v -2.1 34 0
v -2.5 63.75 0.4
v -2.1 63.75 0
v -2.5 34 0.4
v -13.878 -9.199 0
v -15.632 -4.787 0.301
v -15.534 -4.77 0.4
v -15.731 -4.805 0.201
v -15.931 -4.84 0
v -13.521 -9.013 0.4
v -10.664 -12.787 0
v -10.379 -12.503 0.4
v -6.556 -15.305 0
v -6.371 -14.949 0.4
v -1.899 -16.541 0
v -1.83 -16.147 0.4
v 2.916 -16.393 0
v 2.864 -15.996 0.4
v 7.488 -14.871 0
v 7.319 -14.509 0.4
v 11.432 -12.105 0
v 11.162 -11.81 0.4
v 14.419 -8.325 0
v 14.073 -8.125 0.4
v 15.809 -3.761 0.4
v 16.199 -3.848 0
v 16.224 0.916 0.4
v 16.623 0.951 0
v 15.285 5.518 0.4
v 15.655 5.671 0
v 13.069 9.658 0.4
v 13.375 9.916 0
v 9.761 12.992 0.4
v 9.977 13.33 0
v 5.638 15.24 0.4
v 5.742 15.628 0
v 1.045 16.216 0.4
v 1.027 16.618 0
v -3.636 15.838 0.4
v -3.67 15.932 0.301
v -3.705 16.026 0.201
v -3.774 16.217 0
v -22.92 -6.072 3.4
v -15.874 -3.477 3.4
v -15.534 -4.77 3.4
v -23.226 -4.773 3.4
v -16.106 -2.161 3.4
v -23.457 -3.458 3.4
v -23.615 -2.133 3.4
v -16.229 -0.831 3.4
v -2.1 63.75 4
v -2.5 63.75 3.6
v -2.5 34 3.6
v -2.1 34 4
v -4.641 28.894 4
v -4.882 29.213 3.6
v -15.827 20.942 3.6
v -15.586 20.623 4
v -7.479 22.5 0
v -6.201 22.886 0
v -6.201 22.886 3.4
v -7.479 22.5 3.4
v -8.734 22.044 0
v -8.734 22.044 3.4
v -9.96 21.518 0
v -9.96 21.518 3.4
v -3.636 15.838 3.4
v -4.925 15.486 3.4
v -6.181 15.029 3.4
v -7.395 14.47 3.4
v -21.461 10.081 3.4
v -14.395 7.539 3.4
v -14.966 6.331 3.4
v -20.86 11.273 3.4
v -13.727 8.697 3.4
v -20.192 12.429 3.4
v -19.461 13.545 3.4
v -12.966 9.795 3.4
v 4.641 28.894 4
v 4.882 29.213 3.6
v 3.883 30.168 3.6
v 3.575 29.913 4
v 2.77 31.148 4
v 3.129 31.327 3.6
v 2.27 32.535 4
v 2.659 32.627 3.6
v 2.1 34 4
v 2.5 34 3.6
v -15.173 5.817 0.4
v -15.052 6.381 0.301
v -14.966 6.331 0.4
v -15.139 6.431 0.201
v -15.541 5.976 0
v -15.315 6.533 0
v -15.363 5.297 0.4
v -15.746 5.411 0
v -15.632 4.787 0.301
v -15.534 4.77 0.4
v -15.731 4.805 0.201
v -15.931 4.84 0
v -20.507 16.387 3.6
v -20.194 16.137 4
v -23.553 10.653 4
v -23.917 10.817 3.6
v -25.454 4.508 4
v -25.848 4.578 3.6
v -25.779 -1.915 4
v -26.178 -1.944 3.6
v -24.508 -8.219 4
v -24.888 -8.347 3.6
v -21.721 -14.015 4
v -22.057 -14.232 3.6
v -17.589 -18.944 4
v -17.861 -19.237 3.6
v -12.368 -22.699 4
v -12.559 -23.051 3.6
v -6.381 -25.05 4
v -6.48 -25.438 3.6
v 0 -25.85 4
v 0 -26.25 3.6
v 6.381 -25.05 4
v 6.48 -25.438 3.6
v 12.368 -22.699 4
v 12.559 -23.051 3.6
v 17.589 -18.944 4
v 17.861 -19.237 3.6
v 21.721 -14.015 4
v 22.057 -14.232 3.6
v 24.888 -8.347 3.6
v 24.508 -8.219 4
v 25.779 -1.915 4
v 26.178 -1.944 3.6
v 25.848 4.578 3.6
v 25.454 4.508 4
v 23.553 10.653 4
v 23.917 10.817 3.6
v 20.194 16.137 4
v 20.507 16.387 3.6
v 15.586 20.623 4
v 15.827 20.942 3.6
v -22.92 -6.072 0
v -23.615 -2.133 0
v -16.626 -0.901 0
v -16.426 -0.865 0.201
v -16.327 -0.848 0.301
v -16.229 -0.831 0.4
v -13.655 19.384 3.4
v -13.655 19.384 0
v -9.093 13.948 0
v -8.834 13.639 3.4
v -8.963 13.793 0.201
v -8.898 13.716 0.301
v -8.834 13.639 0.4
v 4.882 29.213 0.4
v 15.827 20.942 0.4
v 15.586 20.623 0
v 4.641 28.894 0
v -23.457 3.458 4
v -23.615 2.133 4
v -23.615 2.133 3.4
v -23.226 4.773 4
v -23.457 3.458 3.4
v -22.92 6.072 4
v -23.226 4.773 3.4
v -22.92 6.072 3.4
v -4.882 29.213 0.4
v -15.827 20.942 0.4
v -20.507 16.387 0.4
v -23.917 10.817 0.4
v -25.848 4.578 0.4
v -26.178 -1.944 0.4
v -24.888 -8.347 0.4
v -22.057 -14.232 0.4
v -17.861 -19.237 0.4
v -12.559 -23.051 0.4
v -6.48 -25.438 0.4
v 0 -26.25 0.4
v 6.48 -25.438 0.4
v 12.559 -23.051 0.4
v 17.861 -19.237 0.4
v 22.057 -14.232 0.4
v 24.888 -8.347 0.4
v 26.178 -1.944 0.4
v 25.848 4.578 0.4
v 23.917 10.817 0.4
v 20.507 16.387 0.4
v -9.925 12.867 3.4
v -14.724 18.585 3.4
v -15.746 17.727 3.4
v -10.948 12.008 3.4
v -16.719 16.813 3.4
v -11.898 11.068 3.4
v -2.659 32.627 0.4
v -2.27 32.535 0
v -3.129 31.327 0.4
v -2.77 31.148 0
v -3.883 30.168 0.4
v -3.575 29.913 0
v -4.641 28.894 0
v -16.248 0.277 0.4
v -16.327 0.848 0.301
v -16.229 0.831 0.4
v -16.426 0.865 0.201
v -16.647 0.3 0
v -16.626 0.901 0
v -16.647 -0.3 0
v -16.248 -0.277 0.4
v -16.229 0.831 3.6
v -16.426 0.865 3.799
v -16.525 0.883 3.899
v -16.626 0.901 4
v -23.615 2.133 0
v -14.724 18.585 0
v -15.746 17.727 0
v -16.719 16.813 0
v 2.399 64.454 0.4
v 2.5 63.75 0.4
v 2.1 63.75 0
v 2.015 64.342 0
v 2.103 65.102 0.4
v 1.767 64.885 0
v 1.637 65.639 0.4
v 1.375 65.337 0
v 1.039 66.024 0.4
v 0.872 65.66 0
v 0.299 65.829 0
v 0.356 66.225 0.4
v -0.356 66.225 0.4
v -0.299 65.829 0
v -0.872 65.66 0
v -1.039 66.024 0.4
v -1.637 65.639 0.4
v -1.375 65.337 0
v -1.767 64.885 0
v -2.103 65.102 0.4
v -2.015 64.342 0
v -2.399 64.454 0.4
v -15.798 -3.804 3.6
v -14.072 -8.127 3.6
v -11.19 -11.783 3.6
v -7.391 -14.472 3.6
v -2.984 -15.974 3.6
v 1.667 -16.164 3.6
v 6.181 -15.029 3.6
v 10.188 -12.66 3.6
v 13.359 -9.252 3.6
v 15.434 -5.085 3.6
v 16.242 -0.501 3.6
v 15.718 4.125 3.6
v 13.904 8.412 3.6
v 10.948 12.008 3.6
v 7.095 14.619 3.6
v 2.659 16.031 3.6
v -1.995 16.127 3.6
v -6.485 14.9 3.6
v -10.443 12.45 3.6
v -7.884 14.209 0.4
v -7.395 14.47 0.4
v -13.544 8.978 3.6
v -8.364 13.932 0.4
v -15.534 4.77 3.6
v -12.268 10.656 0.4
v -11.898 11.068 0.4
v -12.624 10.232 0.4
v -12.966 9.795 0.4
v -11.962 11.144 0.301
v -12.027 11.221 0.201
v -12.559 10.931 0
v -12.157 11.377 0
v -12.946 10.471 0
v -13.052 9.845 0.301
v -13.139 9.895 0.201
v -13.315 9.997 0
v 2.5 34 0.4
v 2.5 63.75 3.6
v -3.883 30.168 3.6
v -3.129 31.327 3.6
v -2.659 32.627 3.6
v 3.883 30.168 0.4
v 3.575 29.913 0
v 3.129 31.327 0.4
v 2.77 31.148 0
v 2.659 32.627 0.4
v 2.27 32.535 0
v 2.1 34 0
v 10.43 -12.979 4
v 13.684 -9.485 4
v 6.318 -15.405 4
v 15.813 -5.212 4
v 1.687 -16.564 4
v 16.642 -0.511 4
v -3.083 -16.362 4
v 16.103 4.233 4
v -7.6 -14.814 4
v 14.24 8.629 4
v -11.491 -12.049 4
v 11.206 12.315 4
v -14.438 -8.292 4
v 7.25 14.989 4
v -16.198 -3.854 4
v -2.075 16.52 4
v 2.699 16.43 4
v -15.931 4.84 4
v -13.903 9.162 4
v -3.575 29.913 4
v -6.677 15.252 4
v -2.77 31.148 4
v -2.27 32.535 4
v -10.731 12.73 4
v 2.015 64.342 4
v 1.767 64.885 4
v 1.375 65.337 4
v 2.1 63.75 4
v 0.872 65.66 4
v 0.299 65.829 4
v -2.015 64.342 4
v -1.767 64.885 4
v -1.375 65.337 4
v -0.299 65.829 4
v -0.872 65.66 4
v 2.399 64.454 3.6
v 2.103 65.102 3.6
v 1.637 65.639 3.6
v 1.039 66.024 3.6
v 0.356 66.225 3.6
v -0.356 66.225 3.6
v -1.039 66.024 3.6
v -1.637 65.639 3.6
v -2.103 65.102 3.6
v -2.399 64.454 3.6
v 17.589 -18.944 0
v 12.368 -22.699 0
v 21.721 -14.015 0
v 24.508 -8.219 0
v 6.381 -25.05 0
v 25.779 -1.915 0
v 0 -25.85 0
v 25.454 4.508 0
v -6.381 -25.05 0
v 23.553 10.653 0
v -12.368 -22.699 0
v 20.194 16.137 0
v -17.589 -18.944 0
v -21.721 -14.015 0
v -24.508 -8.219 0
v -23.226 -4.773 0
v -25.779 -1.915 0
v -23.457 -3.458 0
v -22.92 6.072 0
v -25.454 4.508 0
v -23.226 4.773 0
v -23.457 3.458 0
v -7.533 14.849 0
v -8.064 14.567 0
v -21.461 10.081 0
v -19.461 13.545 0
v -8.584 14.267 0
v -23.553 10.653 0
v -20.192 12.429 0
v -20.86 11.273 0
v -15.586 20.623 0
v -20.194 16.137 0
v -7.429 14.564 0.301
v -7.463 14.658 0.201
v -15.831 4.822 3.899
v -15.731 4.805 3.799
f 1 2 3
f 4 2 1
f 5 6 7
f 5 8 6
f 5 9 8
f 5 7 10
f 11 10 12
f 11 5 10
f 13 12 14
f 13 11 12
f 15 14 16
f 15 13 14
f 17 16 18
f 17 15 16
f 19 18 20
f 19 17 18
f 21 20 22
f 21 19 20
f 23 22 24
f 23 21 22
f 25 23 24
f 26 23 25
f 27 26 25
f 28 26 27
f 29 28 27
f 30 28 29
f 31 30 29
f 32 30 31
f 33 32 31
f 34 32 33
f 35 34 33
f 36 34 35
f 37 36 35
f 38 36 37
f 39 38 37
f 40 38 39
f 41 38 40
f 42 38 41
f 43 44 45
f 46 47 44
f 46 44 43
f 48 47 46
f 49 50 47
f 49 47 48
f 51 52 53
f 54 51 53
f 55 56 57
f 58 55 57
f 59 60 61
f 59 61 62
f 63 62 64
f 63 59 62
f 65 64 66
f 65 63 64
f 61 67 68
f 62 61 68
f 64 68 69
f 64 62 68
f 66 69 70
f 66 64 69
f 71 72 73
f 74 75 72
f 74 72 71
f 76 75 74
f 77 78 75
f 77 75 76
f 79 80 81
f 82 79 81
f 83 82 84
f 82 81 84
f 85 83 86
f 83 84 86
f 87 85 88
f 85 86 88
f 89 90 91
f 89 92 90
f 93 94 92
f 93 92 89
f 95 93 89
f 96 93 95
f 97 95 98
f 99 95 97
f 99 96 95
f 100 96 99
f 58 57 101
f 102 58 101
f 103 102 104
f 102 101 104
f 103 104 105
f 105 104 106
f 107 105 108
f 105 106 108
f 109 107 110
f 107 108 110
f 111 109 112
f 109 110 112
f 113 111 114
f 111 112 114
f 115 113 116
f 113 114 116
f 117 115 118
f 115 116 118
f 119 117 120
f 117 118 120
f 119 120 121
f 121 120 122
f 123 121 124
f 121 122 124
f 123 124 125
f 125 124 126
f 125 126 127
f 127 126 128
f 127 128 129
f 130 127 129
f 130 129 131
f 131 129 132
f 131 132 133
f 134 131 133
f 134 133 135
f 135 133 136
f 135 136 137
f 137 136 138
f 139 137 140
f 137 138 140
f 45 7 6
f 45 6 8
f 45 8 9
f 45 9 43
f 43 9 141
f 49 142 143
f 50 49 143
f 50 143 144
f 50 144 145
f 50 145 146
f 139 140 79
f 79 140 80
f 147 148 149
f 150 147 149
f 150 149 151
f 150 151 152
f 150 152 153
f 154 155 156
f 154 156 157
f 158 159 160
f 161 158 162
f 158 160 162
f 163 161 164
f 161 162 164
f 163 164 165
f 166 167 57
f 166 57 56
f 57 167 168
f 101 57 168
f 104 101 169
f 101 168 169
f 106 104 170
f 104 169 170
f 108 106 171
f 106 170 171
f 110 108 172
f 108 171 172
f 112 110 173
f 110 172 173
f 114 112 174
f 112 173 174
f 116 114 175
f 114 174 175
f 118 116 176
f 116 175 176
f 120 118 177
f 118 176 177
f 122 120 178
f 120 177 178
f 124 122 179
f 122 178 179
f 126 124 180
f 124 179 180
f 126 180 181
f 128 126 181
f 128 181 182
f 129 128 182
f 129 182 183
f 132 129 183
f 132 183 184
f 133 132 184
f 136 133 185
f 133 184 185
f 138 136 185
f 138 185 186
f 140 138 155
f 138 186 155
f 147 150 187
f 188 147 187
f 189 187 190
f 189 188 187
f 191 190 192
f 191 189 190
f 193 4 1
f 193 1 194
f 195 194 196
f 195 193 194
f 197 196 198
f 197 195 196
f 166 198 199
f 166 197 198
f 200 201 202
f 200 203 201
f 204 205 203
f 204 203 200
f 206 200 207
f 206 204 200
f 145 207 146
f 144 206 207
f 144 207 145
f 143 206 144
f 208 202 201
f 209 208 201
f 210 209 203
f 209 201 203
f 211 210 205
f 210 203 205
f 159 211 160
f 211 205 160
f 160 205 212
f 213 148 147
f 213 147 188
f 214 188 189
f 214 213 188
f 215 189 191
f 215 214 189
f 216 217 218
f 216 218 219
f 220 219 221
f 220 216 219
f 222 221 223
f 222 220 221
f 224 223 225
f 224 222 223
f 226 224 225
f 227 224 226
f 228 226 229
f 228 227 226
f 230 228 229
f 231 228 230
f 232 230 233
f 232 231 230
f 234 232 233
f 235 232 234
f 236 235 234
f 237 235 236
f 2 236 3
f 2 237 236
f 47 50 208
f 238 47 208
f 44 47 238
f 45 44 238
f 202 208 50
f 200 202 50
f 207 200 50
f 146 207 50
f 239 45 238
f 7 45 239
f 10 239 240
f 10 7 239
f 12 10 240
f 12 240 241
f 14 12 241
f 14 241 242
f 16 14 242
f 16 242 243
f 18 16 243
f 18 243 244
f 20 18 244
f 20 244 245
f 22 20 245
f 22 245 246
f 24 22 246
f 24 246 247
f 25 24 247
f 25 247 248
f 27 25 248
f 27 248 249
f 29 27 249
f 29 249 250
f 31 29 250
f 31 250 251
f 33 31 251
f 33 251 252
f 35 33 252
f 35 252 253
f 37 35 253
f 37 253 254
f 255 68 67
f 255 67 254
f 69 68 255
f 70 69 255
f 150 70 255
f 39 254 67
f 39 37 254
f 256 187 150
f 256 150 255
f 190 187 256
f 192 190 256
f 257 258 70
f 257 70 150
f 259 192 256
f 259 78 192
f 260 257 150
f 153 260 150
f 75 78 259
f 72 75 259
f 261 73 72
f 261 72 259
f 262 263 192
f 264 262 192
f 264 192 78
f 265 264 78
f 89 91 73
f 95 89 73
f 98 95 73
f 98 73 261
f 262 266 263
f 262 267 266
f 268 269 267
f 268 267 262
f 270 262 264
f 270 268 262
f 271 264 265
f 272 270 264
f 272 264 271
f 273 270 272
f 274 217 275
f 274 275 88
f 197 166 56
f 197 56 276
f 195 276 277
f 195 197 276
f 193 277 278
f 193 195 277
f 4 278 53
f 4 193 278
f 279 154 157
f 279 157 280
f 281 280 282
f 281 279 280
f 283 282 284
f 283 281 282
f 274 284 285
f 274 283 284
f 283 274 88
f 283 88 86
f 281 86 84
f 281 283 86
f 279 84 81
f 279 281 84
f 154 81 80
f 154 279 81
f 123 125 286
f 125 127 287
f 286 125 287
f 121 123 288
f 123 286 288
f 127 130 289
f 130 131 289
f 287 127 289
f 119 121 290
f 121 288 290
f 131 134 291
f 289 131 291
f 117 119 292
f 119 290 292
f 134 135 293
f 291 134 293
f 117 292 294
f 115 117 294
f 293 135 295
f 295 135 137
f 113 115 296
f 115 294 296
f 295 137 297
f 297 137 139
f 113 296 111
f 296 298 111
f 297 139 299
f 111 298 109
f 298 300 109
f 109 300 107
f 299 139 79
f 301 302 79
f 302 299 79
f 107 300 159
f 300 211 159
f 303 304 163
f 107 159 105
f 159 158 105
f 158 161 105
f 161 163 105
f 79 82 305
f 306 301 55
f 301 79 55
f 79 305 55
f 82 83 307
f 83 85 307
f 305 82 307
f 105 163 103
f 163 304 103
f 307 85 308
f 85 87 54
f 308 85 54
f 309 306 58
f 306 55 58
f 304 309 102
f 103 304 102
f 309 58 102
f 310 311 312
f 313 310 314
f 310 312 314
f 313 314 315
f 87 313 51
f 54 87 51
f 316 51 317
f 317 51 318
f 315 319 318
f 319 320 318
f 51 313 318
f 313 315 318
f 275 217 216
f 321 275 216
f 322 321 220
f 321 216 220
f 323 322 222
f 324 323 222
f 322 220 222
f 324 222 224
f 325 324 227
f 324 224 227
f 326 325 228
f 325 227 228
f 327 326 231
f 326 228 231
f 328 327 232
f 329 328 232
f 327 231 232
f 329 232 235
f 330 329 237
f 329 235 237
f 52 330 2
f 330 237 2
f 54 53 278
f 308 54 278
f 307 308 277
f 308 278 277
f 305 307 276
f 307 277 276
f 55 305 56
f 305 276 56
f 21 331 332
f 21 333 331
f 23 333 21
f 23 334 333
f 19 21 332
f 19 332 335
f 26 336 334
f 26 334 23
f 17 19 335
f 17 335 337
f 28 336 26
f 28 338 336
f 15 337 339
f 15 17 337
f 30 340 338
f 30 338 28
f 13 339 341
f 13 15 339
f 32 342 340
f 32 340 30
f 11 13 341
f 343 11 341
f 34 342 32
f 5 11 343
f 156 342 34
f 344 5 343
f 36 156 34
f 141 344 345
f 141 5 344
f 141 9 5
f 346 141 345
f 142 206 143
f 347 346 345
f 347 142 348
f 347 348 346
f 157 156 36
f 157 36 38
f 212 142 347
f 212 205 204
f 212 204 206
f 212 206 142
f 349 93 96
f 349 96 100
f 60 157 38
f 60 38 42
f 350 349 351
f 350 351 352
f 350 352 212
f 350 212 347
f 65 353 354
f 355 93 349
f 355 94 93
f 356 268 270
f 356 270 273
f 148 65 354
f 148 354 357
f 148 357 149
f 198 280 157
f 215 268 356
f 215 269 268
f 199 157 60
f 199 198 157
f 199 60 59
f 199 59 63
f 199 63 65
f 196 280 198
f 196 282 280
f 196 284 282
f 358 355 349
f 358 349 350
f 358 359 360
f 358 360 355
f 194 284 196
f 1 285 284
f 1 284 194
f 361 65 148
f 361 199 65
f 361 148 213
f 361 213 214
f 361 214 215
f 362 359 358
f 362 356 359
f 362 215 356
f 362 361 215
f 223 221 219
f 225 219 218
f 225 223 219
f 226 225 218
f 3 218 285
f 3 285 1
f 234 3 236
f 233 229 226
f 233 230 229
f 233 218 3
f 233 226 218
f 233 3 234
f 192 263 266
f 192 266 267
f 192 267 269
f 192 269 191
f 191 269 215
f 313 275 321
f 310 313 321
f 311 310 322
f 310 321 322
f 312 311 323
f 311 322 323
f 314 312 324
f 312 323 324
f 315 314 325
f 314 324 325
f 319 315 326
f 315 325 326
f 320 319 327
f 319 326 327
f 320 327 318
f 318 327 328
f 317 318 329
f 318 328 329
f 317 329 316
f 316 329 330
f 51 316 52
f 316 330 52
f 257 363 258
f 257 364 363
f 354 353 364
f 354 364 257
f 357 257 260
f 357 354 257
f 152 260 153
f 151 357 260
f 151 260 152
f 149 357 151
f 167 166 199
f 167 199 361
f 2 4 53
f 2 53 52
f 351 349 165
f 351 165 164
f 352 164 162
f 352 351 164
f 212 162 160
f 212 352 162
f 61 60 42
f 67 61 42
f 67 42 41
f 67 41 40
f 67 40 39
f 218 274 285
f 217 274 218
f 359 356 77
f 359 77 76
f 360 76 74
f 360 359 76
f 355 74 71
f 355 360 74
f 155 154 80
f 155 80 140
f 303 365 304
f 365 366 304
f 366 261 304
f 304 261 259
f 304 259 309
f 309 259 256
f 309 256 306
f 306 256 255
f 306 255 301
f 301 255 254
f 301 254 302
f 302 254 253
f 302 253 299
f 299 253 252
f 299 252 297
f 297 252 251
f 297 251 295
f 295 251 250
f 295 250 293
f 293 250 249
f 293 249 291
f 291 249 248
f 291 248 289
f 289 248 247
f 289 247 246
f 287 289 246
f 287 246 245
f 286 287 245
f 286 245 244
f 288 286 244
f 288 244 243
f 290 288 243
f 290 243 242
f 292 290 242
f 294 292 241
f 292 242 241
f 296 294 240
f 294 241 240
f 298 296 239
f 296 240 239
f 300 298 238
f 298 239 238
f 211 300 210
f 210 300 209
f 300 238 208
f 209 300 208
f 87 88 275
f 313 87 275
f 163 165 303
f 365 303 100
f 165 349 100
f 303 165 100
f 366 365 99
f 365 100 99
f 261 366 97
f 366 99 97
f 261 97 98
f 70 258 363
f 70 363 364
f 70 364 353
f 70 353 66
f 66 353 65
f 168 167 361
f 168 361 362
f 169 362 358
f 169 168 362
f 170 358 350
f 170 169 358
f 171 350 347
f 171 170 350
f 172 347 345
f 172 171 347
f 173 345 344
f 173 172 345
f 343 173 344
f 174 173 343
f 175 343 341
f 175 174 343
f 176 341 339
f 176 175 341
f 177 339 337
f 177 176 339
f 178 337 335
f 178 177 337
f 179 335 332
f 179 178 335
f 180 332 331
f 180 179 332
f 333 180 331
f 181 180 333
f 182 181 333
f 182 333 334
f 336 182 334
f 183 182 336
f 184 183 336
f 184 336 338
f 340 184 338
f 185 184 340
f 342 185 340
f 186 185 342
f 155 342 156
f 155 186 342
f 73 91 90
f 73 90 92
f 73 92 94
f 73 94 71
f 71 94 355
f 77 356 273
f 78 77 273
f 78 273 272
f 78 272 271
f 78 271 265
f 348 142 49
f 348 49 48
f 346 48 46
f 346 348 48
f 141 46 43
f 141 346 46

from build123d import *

# Parameters (mm, degrees)
SKETCH039_R     = 16.25
PAD017_DEPTH    = 4
POCKET014_DEPTH = 3.4
POCKET015_DEPTH = 0.601
CHAMFER012_SIZE = 0.4


with BuildPart() as part:
    # Sketch039 → Pad017 (new body)
    with BuildSketch(Plane.XY):
        with BuildLine():
            Line((-15.8267662036, 20.9422055079), (-4.8824534392, 29.2132101696))
            ThreePointArc((-4.8824534392, 29.2132101696), (-3.1285346801, 31.3265452468), (-2.5, 34))
            Line((-2.5, 34), (-2.5, 63.75))
            ThreePointArc((2.5, 63.75), (0, 66.25), (-2.5, 63.75))
            Line((2.5, 63.75), (2.5, 34))
            ThreePointArc((2.5, 34), (3.1285346801, 31.3265452468), (4.8824534392, 29.2132101696))
            Line((4.8824534392, 29.2132101696), (15.8267662036, 20.9422055079))
            ThreePointArc((-15.8267662036, 20.9422055079), (0, -26.25), (15.8267662036, 20.9422055079))
        make_face()
        Circle(SKETCH039_R, mode=Mode.SUBTRACT)
    extrude(amount=PAD017_DEPTH)

    # Sketch040 → Pocket014 (cut)
    with BuildSketch(Plane.XY):
        with BuildLine():
            Line((-14.9659183372, 6.3311759039), (-21.4611088655, 10.0811759039))
            ThreePointArc((-19.4611088655, 13.545277519), (-20.5342878135, 11.8554765967), (-21.4611088655, 10.0811759039))
            Line((-19.4611088655, 13.545277519), (-12.9659183372, 9.795277519))
            Line((-12.9659183372, 9.795277519), (-14.9659183372, 6.3311759039))
        make_face()
        with BuildLine():
            Line((-16.2287527148, 0.8307137431), (-23.6148108624, 2.1330750756))
            ThreePointArc((-22.9202181517, 6.0723060876), (-23.3507305362, 4.1173638128), (-23.6148108624, 2.1330750756))
            Line((-22.9202181517, 6.0723060876), (-15.5341600041, 4.7699447551))
            Line((-15.5341600041, 4.7699447551), (-16.2287527148, 0.8307137431))
        make_face()
        with BuildLine():
            Line((-11.8979733346, 11.0680048124), (-16.7188804073, 16.8133381358))
            ThreePointArc((-13.6547026348, 19.3844885746), (-15.2411069266, 18.1636439349), (-16.7188804073, 16.8133381358))
            Line((-13.6547026348, 19.3844885746), (-8.8337955622, 13.6391552512))
            Line((-11.8979733346, 11.0680048124), (-8.8337955622, 13.6391552512))
        make_face()
        with BuildLine():
            Line((-7.3949571526, 14.4698689943), (-9.9601082275, 21.5175636502))
            ThreePointArc((-6.2013377444, 22.8856442235), (-8.1096236096, 22.2810077477), (-9.9601082275, 21.5175636502))
            Line((-6.2013377444, 22.8856442235), (-3.6361866695, 15.8379495676))
            Line((-7.3949571526, 14.4698689943), (-3.6361866695, 15.8379495676))
        make_face()
        with BuildLine():
            Line((-15.5341600041, -4.7699447551), (-22.9202181517, -6.0723060876))
            ThreePointArc((-23.6148108624, -2.1330750756), (-23.3507305362, -4.1173638128), (-22.9202181517, -6.0723060876))
            Line((-23.6148108624, -2.1330750756), (-16.2287527148, -0.8307137431))
            Line((-16.2287527148, -0.8307137431), (-15.5341600041, -4.7699447551))
        make_face()
    extrude(amount=POCKET014_DEPTH, mode=Mode.SUBTRACT)

    # Pocket014 Face30 → Pocket015 (cut, through all)
    with BuildSketch(Plane(origin=(-19.6427739907, 3.4635510305, 3.4), x_dir=(0, -1, 0), z_dir=(0, 0, -1))):
        with BuildLine():
            Line((2.6328372874, -3.4140212759), (1.3304759549, 3.9720368717))
            ThreePointArc((1.3304759549, 3.9720368717), (-0.6538127823, 3.7079565456), (-2.6087550571, 3.277444161))
            Line((-2.6087550571, 3.277444161), (-1.3063937246, -4.1086139866))
            ThreePointArc((-1.3063937246, -4.1086139866), (0.6417681434, -3.6396480042), (2.6328372874, -3.4140212759))
        make_face()
    extrude(amount=-POCKET015_DEPTH, mode=Mode.SUBTRACT)

    # Chamfer012
    chamfer012_edges = [part.edges().sort_by_distance(p)[0] for p in [
        (2.41168, 16.070044, 4),
        (0, -26.25, 4),
        (0, -26.25, 0),
        (2.41168, -16.070044, 0),
        (-16.25, 0, 0),
        (-15.270005, 5.557827, 0),
        (-12.448222, 10.445299, 0),
        (-8.125, 14.072913, 0),
    ]]
    chamfer(chamfer012_edges, length=CHAMFER012_SIZE)


solid = part.part
